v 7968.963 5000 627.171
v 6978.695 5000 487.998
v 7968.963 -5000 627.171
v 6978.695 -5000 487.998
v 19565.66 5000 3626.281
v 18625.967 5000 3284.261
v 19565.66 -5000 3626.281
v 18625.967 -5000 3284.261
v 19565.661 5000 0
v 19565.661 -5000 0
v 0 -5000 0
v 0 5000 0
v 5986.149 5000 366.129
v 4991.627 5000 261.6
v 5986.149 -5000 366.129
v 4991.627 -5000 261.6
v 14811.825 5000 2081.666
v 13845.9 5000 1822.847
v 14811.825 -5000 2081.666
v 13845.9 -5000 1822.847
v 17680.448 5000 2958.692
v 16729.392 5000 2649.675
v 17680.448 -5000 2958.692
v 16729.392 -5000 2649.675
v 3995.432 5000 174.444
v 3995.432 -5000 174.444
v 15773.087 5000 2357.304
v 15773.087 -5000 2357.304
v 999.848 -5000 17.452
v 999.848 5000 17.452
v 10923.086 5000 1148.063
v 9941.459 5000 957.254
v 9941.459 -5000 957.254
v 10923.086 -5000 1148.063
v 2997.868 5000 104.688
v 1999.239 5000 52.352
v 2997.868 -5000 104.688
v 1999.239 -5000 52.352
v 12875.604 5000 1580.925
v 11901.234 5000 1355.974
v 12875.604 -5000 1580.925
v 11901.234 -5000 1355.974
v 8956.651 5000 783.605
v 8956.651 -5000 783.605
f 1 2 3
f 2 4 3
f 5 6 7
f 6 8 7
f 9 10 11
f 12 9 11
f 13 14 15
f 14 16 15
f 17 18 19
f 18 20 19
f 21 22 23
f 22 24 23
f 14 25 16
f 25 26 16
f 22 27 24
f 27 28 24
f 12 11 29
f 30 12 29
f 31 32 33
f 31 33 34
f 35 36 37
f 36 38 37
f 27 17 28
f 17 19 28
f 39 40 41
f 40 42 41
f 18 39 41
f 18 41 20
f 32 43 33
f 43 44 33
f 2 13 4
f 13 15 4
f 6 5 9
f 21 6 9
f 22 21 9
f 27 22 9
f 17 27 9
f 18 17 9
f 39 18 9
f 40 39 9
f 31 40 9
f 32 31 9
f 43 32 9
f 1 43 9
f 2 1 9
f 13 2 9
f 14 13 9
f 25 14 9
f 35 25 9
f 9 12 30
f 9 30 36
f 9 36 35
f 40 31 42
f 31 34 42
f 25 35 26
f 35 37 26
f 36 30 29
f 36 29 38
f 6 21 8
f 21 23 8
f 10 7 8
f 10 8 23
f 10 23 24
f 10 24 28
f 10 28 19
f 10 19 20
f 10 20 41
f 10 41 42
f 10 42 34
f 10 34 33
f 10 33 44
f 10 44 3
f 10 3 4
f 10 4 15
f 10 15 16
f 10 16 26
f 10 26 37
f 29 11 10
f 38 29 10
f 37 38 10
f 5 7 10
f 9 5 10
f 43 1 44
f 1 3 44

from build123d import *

# Parameters (mm, degrees)
EXTRUDE_DEPTH = 5000


with BuildPart() as part:
    # Sketch → Extrude (new body, symmetric)
    with BuildSketch(Plane.XZ):
        Polygon((0, 0), (999.847695, 17.452406), (1999.238522, 52.351903), (2997.868057, 104.687859), (3995.432107, 174.444333), (4991.626805, 261.600076), (5986.148701, 366.128539), (6978.694852, 487.997883), (7968.962921, 627.170984), (8956.651262, 783.605449), (9941.459015, 957.253626), (10923.086198, 1148.062622), (11901.233799, 1355.974312), (12875.603864, 1580.925367), (13845.89959, 1822.847262), (14811.825416, 2081.666307), (15773.087112, 2357.303663), (16729.391868, 2649.675368), (17680.448384, 2958.692362), (18625.96696, 3284.260517), (19565.659581, 3626.28066), (19565.660766, 0), align=None)
    extrude(amount=EXTRUDE_DEPTH, both=True)


solid = part.part
